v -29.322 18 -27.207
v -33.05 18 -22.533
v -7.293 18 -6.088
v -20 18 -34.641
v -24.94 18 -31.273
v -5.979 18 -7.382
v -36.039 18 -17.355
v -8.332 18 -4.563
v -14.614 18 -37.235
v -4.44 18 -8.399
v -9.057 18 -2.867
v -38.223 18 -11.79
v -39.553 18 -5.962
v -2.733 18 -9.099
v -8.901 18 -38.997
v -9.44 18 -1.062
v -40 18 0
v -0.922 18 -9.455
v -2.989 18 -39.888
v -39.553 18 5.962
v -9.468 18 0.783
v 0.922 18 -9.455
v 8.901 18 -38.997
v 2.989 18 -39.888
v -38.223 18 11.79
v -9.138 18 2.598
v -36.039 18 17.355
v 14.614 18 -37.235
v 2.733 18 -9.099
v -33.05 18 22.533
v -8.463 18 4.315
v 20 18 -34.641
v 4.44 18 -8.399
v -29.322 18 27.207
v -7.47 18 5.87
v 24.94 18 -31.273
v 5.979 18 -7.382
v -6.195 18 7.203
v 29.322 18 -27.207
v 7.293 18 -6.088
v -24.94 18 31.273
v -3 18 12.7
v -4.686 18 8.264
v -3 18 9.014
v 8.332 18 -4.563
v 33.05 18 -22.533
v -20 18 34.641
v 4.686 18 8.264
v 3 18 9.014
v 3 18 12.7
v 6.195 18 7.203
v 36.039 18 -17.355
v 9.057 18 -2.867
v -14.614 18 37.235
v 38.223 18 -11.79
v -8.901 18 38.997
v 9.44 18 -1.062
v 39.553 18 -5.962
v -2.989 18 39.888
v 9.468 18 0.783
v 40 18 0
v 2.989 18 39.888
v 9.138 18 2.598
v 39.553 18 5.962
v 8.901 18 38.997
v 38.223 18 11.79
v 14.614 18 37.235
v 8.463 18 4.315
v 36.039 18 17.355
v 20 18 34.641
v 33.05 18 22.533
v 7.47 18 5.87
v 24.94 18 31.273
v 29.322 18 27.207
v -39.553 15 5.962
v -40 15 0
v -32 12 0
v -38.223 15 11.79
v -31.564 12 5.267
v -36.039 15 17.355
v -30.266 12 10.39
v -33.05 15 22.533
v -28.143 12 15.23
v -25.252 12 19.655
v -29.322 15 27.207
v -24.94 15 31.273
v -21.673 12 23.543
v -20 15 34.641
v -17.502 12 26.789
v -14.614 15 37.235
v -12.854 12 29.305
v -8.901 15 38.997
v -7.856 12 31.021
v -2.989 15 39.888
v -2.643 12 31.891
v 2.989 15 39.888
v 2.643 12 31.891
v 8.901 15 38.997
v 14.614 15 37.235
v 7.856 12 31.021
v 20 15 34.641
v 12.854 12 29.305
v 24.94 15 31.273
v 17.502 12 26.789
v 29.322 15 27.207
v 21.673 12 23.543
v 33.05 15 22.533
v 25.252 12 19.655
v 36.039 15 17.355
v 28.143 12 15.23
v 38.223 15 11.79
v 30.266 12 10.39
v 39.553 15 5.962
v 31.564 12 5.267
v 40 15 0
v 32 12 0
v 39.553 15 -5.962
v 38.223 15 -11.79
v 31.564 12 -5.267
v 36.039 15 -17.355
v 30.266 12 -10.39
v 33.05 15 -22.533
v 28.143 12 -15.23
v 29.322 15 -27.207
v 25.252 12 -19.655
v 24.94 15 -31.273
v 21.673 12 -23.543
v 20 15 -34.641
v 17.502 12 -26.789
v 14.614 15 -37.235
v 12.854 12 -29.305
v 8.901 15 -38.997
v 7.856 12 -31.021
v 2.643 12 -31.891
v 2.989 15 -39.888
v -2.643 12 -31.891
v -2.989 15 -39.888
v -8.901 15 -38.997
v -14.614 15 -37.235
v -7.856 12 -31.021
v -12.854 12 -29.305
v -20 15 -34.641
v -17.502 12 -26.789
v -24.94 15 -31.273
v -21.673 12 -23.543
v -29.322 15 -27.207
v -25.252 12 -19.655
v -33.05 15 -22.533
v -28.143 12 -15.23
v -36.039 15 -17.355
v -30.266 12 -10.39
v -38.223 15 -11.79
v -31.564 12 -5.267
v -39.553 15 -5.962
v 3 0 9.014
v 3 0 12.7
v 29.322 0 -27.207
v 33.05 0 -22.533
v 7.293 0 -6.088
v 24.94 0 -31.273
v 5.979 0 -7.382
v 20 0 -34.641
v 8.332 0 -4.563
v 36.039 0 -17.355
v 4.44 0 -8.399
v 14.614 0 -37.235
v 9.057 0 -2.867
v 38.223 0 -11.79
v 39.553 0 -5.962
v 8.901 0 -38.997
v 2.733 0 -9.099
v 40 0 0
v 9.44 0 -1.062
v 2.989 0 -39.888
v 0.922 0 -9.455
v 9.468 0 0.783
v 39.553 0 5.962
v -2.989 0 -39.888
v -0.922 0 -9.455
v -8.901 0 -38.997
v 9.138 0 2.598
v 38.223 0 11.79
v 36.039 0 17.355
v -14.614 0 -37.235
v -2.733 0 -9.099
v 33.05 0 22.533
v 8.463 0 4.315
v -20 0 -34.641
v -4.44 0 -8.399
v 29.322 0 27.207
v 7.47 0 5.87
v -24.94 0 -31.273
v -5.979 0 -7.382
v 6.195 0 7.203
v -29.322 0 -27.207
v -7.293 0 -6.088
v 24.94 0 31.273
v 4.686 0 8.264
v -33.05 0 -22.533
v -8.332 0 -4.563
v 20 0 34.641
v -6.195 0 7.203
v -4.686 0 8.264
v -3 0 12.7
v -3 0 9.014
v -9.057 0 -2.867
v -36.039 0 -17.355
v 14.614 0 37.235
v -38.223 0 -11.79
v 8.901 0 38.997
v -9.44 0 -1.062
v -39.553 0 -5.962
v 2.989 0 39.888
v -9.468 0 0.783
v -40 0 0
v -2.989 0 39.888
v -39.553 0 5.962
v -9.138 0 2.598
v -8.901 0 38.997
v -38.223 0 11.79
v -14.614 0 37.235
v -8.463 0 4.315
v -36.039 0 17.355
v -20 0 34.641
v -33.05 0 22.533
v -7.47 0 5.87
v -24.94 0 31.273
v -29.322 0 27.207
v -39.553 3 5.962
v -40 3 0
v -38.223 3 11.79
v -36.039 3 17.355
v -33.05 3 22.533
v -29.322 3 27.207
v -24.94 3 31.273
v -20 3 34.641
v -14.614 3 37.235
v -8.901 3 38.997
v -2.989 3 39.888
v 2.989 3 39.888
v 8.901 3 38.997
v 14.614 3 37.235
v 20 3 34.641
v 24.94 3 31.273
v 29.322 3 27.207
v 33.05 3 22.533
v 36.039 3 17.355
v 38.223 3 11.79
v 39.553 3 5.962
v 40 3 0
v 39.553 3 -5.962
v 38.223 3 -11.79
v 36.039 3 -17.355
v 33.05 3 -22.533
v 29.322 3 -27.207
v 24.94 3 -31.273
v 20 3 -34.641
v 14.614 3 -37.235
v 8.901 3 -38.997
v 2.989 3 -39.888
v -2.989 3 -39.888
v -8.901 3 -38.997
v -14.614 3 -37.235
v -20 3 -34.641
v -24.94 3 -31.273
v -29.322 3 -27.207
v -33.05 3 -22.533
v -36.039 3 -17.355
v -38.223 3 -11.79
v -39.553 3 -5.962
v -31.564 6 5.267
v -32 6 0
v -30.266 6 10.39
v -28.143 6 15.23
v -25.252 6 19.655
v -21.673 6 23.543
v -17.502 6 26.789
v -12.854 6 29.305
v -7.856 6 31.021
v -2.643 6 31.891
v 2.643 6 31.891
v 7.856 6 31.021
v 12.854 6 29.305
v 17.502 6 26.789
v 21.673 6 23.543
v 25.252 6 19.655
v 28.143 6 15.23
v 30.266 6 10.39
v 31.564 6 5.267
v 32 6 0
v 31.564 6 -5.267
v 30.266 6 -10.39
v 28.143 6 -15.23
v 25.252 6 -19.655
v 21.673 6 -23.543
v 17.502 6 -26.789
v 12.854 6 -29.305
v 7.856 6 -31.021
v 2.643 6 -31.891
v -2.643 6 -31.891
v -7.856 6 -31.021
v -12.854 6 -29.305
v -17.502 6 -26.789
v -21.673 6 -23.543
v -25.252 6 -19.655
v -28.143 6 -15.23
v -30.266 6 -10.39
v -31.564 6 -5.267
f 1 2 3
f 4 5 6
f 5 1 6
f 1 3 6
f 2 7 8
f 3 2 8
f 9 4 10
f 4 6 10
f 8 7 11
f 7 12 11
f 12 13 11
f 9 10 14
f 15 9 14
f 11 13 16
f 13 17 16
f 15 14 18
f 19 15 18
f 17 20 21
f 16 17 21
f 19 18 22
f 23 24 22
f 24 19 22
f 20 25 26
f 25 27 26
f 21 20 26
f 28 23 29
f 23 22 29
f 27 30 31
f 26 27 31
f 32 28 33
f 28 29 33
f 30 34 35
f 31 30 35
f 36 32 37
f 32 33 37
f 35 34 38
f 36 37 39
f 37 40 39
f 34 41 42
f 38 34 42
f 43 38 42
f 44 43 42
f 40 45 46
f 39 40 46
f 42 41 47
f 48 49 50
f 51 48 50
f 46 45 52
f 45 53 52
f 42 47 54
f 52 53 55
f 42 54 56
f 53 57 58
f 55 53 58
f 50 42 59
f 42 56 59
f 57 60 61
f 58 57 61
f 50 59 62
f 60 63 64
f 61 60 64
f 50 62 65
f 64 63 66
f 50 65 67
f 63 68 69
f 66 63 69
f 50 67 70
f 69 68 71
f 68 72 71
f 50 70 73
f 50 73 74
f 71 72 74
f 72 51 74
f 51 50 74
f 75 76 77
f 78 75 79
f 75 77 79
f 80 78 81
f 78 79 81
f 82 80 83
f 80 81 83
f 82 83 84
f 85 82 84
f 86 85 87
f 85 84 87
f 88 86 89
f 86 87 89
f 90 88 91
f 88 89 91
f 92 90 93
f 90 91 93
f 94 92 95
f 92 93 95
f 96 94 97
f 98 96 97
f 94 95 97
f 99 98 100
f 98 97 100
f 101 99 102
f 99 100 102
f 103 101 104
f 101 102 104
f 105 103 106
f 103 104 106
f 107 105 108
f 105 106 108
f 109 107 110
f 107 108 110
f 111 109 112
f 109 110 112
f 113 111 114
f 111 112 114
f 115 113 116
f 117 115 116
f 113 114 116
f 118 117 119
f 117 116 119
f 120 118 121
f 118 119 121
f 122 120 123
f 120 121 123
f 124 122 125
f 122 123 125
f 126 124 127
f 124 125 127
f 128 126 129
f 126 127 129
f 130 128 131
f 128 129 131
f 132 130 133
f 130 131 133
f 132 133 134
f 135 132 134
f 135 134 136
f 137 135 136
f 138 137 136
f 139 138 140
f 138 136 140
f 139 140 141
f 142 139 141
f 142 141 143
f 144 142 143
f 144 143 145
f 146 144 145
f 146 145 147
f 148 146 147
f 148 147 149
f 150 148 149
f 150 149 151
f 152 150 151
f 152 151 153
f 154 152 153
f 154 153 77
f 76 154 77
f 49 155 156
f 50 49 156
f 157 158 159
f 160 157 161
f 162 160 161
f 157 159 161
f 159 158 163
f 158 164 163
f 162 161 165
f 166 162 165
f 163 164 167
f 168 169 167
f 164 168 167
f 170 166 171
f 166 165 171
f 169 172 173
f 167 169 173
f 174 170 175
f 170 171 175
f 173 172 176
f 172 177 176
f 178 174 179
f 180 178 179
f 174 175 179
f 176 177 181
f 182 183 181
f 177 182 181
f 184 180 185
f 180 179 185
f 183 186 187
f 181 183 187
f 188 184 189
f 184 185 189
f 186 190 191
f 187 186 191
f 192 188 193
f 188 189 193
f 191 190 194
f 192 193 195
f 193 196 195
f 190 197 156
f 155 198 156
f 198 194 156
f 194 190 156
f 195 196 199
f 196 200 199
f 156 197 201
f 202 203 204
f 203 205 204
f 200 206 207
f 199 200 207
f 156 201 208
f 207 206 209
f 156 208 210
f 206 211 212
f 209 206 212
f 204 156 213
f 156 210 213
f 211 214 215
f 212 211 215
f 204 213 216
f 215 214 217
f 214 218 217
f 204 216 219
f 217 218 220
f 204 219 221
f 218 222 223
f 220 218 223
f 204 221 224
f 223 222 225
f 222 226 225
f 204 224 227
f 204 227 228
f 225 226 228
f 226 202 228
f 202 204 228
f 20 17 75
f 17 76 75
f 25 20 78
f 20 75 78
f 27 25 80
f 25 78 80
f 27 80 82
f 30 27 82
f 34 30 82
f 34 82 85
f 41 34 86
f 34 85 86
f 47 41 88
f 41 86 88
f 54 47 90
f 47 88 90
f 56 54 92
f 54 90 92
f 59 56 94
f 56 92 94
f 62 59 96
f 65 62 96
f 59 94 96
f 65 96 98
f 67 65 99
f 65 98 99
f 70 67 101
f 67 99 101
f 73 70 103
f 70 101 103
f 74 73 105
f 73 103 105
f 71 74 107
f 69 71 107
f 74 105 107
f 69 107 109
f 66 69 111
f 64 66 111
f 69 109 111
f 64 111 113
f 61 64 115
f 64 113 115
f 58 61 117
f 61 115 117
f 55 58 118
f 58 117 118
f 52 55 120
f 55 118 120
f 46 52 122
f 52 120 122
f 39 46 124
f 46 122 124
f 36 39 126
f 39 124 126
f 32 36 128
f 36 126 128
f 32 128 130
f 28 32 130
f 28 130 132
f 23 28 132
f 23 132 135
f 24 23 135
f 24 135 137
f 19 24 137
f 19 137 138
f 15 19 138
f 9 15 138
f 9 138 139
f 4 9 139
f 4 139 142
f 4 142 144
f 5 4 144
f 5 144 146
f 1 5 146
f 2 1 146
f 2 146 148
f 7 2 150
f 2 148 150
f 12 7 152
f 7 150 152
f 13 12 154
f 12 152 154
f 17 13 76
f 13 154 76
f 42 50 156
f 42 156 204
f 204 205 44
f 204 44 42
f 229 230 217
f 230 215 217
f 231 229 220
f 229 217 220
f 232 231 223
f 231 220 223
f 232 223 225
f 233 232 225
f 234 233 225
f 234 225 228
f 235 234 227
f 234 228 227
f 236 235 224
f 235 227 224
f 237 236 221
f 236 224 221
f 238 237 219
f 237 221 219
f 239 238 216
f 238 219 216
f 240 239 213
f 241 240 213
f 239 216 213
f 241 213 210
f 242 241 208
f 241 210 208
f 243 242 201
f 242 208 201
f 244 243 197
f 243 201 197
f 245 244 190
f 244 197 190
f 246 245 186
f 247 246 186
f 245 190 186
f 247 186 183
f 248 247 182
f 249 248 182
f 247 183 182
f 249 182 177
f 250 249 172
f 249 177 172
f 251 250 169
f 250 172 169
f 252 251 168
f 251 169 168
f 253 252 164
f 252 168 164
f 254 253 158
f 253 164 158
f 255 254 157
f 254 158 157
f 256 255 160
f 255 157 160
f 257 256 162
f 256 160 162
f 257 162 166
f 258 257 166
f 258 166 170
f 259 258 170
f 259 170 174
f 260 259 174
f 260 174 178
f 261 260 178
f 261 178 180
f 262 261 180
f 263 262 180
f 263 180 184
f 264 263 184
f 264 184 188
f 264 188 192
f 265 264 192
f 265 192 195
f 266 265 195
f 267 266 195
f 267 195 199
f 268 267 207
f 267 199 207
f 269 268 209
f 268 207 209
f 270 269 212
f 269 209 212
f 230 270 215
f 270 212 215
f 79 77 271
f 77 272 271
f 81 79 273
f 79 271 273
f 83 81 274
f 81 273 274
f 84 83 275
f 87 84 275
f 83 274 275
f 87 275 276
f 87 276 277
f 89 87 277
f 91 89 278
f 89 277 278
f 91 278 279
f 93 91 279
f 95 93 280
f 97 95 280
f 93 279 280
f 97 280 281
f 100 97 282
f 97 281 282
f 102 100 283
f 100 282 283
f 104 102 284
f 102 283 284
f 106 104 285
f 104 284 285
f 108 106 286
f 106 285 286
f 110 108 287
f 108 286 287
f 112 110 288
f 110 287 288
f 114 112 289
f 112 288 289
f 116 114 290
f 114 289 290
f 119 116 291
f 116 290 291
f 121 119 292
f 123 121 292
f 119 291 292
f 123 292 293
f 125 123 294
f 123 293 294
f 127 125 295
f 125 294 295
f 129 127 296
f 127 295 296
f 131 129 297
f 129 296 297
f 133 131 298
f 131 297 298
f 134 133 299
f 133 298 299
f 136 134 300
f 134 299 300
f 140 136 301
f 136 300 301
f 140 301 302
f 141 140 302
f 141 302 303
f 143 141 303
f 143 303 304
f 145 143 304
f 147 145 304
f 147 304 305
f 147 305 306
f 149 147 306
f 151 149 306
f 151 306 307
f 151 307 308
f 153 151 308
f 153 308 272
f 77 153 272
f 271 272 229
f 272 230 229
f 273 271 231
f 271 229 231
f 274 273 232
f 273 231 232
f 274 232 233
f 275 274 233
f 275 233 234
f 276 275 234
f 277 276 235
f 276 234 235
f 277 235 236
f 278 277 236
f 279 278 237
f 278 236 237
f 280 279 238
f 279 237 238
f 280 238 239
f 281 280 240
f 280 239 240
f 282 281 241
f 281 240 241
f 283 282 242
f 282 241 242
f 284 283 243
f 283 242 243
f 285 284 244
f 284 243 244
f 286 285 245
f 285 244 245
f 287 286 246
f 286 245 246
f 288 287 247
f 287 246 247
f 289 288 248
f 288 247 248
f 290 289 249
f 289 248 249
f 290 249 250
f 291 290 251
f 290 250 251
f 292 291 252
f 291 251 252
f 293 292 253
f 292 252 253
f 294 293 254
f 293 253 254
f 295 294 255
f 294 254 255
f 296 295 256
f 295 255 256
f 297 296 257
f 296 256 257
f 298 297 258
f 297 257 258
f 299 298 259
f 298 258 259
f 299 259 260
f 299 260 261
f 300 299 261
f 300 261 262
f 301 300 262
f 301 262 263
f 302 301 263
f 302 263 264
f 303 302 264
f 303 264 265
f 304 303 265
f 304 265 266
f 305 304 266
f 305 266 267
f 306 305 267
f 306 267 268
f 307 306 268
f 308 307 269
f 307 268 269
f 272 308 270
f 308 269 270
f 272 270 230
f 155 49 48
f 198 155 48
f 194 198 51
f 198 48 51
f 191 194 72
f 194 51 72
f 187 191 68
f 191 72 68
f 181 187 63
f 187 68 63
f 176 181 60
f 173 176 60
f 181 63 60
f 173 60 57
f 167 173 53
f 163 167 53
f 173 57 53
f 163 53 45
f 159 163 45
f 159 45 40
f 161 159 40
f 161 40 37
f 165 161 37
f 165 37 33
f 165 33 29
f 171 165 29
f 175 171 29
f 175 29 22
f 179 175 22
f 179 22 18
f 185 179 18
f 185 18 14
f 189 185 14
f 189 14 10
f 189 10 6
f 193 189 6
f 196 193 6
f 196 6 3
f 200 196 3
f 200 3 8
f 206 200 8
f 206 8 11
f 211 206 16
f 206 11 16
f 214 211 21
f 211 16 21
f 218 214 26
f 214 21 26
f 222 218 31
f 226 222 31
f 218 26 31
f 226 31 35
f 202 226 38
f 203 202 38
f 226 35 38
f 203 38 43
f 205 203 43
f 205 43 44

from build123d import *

# Parameters (mm, degrees)
F2_W     = 6
F2_H     = 9.412618
F3_DEPTH = 25


with BuildPart() as f1:
    # F0 (on Top) → F1 (revolve)
    with BuildSketch(Plane.XY):
        Polygon((-40, 0), (-9.5, 0), (-9.5, 18), (-40, 18), (-40, 15), (-32, 12), (-32, 6), (-40, 3), align=None)
    revolve(axis=Axis((0, 10.892909, 0), (0, 1, 0)))

    # F2 (on face) → F3 (cut)
    with BuildSketch(Plane(origin=(0, 18, 0), x_dir=(-1, 0, 0), z_dir=(0, 1, 0))):
        with Locations((0, 7.993691)):
            Rectangle(F2_W, F2_H)
    extrude(amount=-F3_DEPTH, mode=Mode.SUBTRACT)


solid = f1.part
